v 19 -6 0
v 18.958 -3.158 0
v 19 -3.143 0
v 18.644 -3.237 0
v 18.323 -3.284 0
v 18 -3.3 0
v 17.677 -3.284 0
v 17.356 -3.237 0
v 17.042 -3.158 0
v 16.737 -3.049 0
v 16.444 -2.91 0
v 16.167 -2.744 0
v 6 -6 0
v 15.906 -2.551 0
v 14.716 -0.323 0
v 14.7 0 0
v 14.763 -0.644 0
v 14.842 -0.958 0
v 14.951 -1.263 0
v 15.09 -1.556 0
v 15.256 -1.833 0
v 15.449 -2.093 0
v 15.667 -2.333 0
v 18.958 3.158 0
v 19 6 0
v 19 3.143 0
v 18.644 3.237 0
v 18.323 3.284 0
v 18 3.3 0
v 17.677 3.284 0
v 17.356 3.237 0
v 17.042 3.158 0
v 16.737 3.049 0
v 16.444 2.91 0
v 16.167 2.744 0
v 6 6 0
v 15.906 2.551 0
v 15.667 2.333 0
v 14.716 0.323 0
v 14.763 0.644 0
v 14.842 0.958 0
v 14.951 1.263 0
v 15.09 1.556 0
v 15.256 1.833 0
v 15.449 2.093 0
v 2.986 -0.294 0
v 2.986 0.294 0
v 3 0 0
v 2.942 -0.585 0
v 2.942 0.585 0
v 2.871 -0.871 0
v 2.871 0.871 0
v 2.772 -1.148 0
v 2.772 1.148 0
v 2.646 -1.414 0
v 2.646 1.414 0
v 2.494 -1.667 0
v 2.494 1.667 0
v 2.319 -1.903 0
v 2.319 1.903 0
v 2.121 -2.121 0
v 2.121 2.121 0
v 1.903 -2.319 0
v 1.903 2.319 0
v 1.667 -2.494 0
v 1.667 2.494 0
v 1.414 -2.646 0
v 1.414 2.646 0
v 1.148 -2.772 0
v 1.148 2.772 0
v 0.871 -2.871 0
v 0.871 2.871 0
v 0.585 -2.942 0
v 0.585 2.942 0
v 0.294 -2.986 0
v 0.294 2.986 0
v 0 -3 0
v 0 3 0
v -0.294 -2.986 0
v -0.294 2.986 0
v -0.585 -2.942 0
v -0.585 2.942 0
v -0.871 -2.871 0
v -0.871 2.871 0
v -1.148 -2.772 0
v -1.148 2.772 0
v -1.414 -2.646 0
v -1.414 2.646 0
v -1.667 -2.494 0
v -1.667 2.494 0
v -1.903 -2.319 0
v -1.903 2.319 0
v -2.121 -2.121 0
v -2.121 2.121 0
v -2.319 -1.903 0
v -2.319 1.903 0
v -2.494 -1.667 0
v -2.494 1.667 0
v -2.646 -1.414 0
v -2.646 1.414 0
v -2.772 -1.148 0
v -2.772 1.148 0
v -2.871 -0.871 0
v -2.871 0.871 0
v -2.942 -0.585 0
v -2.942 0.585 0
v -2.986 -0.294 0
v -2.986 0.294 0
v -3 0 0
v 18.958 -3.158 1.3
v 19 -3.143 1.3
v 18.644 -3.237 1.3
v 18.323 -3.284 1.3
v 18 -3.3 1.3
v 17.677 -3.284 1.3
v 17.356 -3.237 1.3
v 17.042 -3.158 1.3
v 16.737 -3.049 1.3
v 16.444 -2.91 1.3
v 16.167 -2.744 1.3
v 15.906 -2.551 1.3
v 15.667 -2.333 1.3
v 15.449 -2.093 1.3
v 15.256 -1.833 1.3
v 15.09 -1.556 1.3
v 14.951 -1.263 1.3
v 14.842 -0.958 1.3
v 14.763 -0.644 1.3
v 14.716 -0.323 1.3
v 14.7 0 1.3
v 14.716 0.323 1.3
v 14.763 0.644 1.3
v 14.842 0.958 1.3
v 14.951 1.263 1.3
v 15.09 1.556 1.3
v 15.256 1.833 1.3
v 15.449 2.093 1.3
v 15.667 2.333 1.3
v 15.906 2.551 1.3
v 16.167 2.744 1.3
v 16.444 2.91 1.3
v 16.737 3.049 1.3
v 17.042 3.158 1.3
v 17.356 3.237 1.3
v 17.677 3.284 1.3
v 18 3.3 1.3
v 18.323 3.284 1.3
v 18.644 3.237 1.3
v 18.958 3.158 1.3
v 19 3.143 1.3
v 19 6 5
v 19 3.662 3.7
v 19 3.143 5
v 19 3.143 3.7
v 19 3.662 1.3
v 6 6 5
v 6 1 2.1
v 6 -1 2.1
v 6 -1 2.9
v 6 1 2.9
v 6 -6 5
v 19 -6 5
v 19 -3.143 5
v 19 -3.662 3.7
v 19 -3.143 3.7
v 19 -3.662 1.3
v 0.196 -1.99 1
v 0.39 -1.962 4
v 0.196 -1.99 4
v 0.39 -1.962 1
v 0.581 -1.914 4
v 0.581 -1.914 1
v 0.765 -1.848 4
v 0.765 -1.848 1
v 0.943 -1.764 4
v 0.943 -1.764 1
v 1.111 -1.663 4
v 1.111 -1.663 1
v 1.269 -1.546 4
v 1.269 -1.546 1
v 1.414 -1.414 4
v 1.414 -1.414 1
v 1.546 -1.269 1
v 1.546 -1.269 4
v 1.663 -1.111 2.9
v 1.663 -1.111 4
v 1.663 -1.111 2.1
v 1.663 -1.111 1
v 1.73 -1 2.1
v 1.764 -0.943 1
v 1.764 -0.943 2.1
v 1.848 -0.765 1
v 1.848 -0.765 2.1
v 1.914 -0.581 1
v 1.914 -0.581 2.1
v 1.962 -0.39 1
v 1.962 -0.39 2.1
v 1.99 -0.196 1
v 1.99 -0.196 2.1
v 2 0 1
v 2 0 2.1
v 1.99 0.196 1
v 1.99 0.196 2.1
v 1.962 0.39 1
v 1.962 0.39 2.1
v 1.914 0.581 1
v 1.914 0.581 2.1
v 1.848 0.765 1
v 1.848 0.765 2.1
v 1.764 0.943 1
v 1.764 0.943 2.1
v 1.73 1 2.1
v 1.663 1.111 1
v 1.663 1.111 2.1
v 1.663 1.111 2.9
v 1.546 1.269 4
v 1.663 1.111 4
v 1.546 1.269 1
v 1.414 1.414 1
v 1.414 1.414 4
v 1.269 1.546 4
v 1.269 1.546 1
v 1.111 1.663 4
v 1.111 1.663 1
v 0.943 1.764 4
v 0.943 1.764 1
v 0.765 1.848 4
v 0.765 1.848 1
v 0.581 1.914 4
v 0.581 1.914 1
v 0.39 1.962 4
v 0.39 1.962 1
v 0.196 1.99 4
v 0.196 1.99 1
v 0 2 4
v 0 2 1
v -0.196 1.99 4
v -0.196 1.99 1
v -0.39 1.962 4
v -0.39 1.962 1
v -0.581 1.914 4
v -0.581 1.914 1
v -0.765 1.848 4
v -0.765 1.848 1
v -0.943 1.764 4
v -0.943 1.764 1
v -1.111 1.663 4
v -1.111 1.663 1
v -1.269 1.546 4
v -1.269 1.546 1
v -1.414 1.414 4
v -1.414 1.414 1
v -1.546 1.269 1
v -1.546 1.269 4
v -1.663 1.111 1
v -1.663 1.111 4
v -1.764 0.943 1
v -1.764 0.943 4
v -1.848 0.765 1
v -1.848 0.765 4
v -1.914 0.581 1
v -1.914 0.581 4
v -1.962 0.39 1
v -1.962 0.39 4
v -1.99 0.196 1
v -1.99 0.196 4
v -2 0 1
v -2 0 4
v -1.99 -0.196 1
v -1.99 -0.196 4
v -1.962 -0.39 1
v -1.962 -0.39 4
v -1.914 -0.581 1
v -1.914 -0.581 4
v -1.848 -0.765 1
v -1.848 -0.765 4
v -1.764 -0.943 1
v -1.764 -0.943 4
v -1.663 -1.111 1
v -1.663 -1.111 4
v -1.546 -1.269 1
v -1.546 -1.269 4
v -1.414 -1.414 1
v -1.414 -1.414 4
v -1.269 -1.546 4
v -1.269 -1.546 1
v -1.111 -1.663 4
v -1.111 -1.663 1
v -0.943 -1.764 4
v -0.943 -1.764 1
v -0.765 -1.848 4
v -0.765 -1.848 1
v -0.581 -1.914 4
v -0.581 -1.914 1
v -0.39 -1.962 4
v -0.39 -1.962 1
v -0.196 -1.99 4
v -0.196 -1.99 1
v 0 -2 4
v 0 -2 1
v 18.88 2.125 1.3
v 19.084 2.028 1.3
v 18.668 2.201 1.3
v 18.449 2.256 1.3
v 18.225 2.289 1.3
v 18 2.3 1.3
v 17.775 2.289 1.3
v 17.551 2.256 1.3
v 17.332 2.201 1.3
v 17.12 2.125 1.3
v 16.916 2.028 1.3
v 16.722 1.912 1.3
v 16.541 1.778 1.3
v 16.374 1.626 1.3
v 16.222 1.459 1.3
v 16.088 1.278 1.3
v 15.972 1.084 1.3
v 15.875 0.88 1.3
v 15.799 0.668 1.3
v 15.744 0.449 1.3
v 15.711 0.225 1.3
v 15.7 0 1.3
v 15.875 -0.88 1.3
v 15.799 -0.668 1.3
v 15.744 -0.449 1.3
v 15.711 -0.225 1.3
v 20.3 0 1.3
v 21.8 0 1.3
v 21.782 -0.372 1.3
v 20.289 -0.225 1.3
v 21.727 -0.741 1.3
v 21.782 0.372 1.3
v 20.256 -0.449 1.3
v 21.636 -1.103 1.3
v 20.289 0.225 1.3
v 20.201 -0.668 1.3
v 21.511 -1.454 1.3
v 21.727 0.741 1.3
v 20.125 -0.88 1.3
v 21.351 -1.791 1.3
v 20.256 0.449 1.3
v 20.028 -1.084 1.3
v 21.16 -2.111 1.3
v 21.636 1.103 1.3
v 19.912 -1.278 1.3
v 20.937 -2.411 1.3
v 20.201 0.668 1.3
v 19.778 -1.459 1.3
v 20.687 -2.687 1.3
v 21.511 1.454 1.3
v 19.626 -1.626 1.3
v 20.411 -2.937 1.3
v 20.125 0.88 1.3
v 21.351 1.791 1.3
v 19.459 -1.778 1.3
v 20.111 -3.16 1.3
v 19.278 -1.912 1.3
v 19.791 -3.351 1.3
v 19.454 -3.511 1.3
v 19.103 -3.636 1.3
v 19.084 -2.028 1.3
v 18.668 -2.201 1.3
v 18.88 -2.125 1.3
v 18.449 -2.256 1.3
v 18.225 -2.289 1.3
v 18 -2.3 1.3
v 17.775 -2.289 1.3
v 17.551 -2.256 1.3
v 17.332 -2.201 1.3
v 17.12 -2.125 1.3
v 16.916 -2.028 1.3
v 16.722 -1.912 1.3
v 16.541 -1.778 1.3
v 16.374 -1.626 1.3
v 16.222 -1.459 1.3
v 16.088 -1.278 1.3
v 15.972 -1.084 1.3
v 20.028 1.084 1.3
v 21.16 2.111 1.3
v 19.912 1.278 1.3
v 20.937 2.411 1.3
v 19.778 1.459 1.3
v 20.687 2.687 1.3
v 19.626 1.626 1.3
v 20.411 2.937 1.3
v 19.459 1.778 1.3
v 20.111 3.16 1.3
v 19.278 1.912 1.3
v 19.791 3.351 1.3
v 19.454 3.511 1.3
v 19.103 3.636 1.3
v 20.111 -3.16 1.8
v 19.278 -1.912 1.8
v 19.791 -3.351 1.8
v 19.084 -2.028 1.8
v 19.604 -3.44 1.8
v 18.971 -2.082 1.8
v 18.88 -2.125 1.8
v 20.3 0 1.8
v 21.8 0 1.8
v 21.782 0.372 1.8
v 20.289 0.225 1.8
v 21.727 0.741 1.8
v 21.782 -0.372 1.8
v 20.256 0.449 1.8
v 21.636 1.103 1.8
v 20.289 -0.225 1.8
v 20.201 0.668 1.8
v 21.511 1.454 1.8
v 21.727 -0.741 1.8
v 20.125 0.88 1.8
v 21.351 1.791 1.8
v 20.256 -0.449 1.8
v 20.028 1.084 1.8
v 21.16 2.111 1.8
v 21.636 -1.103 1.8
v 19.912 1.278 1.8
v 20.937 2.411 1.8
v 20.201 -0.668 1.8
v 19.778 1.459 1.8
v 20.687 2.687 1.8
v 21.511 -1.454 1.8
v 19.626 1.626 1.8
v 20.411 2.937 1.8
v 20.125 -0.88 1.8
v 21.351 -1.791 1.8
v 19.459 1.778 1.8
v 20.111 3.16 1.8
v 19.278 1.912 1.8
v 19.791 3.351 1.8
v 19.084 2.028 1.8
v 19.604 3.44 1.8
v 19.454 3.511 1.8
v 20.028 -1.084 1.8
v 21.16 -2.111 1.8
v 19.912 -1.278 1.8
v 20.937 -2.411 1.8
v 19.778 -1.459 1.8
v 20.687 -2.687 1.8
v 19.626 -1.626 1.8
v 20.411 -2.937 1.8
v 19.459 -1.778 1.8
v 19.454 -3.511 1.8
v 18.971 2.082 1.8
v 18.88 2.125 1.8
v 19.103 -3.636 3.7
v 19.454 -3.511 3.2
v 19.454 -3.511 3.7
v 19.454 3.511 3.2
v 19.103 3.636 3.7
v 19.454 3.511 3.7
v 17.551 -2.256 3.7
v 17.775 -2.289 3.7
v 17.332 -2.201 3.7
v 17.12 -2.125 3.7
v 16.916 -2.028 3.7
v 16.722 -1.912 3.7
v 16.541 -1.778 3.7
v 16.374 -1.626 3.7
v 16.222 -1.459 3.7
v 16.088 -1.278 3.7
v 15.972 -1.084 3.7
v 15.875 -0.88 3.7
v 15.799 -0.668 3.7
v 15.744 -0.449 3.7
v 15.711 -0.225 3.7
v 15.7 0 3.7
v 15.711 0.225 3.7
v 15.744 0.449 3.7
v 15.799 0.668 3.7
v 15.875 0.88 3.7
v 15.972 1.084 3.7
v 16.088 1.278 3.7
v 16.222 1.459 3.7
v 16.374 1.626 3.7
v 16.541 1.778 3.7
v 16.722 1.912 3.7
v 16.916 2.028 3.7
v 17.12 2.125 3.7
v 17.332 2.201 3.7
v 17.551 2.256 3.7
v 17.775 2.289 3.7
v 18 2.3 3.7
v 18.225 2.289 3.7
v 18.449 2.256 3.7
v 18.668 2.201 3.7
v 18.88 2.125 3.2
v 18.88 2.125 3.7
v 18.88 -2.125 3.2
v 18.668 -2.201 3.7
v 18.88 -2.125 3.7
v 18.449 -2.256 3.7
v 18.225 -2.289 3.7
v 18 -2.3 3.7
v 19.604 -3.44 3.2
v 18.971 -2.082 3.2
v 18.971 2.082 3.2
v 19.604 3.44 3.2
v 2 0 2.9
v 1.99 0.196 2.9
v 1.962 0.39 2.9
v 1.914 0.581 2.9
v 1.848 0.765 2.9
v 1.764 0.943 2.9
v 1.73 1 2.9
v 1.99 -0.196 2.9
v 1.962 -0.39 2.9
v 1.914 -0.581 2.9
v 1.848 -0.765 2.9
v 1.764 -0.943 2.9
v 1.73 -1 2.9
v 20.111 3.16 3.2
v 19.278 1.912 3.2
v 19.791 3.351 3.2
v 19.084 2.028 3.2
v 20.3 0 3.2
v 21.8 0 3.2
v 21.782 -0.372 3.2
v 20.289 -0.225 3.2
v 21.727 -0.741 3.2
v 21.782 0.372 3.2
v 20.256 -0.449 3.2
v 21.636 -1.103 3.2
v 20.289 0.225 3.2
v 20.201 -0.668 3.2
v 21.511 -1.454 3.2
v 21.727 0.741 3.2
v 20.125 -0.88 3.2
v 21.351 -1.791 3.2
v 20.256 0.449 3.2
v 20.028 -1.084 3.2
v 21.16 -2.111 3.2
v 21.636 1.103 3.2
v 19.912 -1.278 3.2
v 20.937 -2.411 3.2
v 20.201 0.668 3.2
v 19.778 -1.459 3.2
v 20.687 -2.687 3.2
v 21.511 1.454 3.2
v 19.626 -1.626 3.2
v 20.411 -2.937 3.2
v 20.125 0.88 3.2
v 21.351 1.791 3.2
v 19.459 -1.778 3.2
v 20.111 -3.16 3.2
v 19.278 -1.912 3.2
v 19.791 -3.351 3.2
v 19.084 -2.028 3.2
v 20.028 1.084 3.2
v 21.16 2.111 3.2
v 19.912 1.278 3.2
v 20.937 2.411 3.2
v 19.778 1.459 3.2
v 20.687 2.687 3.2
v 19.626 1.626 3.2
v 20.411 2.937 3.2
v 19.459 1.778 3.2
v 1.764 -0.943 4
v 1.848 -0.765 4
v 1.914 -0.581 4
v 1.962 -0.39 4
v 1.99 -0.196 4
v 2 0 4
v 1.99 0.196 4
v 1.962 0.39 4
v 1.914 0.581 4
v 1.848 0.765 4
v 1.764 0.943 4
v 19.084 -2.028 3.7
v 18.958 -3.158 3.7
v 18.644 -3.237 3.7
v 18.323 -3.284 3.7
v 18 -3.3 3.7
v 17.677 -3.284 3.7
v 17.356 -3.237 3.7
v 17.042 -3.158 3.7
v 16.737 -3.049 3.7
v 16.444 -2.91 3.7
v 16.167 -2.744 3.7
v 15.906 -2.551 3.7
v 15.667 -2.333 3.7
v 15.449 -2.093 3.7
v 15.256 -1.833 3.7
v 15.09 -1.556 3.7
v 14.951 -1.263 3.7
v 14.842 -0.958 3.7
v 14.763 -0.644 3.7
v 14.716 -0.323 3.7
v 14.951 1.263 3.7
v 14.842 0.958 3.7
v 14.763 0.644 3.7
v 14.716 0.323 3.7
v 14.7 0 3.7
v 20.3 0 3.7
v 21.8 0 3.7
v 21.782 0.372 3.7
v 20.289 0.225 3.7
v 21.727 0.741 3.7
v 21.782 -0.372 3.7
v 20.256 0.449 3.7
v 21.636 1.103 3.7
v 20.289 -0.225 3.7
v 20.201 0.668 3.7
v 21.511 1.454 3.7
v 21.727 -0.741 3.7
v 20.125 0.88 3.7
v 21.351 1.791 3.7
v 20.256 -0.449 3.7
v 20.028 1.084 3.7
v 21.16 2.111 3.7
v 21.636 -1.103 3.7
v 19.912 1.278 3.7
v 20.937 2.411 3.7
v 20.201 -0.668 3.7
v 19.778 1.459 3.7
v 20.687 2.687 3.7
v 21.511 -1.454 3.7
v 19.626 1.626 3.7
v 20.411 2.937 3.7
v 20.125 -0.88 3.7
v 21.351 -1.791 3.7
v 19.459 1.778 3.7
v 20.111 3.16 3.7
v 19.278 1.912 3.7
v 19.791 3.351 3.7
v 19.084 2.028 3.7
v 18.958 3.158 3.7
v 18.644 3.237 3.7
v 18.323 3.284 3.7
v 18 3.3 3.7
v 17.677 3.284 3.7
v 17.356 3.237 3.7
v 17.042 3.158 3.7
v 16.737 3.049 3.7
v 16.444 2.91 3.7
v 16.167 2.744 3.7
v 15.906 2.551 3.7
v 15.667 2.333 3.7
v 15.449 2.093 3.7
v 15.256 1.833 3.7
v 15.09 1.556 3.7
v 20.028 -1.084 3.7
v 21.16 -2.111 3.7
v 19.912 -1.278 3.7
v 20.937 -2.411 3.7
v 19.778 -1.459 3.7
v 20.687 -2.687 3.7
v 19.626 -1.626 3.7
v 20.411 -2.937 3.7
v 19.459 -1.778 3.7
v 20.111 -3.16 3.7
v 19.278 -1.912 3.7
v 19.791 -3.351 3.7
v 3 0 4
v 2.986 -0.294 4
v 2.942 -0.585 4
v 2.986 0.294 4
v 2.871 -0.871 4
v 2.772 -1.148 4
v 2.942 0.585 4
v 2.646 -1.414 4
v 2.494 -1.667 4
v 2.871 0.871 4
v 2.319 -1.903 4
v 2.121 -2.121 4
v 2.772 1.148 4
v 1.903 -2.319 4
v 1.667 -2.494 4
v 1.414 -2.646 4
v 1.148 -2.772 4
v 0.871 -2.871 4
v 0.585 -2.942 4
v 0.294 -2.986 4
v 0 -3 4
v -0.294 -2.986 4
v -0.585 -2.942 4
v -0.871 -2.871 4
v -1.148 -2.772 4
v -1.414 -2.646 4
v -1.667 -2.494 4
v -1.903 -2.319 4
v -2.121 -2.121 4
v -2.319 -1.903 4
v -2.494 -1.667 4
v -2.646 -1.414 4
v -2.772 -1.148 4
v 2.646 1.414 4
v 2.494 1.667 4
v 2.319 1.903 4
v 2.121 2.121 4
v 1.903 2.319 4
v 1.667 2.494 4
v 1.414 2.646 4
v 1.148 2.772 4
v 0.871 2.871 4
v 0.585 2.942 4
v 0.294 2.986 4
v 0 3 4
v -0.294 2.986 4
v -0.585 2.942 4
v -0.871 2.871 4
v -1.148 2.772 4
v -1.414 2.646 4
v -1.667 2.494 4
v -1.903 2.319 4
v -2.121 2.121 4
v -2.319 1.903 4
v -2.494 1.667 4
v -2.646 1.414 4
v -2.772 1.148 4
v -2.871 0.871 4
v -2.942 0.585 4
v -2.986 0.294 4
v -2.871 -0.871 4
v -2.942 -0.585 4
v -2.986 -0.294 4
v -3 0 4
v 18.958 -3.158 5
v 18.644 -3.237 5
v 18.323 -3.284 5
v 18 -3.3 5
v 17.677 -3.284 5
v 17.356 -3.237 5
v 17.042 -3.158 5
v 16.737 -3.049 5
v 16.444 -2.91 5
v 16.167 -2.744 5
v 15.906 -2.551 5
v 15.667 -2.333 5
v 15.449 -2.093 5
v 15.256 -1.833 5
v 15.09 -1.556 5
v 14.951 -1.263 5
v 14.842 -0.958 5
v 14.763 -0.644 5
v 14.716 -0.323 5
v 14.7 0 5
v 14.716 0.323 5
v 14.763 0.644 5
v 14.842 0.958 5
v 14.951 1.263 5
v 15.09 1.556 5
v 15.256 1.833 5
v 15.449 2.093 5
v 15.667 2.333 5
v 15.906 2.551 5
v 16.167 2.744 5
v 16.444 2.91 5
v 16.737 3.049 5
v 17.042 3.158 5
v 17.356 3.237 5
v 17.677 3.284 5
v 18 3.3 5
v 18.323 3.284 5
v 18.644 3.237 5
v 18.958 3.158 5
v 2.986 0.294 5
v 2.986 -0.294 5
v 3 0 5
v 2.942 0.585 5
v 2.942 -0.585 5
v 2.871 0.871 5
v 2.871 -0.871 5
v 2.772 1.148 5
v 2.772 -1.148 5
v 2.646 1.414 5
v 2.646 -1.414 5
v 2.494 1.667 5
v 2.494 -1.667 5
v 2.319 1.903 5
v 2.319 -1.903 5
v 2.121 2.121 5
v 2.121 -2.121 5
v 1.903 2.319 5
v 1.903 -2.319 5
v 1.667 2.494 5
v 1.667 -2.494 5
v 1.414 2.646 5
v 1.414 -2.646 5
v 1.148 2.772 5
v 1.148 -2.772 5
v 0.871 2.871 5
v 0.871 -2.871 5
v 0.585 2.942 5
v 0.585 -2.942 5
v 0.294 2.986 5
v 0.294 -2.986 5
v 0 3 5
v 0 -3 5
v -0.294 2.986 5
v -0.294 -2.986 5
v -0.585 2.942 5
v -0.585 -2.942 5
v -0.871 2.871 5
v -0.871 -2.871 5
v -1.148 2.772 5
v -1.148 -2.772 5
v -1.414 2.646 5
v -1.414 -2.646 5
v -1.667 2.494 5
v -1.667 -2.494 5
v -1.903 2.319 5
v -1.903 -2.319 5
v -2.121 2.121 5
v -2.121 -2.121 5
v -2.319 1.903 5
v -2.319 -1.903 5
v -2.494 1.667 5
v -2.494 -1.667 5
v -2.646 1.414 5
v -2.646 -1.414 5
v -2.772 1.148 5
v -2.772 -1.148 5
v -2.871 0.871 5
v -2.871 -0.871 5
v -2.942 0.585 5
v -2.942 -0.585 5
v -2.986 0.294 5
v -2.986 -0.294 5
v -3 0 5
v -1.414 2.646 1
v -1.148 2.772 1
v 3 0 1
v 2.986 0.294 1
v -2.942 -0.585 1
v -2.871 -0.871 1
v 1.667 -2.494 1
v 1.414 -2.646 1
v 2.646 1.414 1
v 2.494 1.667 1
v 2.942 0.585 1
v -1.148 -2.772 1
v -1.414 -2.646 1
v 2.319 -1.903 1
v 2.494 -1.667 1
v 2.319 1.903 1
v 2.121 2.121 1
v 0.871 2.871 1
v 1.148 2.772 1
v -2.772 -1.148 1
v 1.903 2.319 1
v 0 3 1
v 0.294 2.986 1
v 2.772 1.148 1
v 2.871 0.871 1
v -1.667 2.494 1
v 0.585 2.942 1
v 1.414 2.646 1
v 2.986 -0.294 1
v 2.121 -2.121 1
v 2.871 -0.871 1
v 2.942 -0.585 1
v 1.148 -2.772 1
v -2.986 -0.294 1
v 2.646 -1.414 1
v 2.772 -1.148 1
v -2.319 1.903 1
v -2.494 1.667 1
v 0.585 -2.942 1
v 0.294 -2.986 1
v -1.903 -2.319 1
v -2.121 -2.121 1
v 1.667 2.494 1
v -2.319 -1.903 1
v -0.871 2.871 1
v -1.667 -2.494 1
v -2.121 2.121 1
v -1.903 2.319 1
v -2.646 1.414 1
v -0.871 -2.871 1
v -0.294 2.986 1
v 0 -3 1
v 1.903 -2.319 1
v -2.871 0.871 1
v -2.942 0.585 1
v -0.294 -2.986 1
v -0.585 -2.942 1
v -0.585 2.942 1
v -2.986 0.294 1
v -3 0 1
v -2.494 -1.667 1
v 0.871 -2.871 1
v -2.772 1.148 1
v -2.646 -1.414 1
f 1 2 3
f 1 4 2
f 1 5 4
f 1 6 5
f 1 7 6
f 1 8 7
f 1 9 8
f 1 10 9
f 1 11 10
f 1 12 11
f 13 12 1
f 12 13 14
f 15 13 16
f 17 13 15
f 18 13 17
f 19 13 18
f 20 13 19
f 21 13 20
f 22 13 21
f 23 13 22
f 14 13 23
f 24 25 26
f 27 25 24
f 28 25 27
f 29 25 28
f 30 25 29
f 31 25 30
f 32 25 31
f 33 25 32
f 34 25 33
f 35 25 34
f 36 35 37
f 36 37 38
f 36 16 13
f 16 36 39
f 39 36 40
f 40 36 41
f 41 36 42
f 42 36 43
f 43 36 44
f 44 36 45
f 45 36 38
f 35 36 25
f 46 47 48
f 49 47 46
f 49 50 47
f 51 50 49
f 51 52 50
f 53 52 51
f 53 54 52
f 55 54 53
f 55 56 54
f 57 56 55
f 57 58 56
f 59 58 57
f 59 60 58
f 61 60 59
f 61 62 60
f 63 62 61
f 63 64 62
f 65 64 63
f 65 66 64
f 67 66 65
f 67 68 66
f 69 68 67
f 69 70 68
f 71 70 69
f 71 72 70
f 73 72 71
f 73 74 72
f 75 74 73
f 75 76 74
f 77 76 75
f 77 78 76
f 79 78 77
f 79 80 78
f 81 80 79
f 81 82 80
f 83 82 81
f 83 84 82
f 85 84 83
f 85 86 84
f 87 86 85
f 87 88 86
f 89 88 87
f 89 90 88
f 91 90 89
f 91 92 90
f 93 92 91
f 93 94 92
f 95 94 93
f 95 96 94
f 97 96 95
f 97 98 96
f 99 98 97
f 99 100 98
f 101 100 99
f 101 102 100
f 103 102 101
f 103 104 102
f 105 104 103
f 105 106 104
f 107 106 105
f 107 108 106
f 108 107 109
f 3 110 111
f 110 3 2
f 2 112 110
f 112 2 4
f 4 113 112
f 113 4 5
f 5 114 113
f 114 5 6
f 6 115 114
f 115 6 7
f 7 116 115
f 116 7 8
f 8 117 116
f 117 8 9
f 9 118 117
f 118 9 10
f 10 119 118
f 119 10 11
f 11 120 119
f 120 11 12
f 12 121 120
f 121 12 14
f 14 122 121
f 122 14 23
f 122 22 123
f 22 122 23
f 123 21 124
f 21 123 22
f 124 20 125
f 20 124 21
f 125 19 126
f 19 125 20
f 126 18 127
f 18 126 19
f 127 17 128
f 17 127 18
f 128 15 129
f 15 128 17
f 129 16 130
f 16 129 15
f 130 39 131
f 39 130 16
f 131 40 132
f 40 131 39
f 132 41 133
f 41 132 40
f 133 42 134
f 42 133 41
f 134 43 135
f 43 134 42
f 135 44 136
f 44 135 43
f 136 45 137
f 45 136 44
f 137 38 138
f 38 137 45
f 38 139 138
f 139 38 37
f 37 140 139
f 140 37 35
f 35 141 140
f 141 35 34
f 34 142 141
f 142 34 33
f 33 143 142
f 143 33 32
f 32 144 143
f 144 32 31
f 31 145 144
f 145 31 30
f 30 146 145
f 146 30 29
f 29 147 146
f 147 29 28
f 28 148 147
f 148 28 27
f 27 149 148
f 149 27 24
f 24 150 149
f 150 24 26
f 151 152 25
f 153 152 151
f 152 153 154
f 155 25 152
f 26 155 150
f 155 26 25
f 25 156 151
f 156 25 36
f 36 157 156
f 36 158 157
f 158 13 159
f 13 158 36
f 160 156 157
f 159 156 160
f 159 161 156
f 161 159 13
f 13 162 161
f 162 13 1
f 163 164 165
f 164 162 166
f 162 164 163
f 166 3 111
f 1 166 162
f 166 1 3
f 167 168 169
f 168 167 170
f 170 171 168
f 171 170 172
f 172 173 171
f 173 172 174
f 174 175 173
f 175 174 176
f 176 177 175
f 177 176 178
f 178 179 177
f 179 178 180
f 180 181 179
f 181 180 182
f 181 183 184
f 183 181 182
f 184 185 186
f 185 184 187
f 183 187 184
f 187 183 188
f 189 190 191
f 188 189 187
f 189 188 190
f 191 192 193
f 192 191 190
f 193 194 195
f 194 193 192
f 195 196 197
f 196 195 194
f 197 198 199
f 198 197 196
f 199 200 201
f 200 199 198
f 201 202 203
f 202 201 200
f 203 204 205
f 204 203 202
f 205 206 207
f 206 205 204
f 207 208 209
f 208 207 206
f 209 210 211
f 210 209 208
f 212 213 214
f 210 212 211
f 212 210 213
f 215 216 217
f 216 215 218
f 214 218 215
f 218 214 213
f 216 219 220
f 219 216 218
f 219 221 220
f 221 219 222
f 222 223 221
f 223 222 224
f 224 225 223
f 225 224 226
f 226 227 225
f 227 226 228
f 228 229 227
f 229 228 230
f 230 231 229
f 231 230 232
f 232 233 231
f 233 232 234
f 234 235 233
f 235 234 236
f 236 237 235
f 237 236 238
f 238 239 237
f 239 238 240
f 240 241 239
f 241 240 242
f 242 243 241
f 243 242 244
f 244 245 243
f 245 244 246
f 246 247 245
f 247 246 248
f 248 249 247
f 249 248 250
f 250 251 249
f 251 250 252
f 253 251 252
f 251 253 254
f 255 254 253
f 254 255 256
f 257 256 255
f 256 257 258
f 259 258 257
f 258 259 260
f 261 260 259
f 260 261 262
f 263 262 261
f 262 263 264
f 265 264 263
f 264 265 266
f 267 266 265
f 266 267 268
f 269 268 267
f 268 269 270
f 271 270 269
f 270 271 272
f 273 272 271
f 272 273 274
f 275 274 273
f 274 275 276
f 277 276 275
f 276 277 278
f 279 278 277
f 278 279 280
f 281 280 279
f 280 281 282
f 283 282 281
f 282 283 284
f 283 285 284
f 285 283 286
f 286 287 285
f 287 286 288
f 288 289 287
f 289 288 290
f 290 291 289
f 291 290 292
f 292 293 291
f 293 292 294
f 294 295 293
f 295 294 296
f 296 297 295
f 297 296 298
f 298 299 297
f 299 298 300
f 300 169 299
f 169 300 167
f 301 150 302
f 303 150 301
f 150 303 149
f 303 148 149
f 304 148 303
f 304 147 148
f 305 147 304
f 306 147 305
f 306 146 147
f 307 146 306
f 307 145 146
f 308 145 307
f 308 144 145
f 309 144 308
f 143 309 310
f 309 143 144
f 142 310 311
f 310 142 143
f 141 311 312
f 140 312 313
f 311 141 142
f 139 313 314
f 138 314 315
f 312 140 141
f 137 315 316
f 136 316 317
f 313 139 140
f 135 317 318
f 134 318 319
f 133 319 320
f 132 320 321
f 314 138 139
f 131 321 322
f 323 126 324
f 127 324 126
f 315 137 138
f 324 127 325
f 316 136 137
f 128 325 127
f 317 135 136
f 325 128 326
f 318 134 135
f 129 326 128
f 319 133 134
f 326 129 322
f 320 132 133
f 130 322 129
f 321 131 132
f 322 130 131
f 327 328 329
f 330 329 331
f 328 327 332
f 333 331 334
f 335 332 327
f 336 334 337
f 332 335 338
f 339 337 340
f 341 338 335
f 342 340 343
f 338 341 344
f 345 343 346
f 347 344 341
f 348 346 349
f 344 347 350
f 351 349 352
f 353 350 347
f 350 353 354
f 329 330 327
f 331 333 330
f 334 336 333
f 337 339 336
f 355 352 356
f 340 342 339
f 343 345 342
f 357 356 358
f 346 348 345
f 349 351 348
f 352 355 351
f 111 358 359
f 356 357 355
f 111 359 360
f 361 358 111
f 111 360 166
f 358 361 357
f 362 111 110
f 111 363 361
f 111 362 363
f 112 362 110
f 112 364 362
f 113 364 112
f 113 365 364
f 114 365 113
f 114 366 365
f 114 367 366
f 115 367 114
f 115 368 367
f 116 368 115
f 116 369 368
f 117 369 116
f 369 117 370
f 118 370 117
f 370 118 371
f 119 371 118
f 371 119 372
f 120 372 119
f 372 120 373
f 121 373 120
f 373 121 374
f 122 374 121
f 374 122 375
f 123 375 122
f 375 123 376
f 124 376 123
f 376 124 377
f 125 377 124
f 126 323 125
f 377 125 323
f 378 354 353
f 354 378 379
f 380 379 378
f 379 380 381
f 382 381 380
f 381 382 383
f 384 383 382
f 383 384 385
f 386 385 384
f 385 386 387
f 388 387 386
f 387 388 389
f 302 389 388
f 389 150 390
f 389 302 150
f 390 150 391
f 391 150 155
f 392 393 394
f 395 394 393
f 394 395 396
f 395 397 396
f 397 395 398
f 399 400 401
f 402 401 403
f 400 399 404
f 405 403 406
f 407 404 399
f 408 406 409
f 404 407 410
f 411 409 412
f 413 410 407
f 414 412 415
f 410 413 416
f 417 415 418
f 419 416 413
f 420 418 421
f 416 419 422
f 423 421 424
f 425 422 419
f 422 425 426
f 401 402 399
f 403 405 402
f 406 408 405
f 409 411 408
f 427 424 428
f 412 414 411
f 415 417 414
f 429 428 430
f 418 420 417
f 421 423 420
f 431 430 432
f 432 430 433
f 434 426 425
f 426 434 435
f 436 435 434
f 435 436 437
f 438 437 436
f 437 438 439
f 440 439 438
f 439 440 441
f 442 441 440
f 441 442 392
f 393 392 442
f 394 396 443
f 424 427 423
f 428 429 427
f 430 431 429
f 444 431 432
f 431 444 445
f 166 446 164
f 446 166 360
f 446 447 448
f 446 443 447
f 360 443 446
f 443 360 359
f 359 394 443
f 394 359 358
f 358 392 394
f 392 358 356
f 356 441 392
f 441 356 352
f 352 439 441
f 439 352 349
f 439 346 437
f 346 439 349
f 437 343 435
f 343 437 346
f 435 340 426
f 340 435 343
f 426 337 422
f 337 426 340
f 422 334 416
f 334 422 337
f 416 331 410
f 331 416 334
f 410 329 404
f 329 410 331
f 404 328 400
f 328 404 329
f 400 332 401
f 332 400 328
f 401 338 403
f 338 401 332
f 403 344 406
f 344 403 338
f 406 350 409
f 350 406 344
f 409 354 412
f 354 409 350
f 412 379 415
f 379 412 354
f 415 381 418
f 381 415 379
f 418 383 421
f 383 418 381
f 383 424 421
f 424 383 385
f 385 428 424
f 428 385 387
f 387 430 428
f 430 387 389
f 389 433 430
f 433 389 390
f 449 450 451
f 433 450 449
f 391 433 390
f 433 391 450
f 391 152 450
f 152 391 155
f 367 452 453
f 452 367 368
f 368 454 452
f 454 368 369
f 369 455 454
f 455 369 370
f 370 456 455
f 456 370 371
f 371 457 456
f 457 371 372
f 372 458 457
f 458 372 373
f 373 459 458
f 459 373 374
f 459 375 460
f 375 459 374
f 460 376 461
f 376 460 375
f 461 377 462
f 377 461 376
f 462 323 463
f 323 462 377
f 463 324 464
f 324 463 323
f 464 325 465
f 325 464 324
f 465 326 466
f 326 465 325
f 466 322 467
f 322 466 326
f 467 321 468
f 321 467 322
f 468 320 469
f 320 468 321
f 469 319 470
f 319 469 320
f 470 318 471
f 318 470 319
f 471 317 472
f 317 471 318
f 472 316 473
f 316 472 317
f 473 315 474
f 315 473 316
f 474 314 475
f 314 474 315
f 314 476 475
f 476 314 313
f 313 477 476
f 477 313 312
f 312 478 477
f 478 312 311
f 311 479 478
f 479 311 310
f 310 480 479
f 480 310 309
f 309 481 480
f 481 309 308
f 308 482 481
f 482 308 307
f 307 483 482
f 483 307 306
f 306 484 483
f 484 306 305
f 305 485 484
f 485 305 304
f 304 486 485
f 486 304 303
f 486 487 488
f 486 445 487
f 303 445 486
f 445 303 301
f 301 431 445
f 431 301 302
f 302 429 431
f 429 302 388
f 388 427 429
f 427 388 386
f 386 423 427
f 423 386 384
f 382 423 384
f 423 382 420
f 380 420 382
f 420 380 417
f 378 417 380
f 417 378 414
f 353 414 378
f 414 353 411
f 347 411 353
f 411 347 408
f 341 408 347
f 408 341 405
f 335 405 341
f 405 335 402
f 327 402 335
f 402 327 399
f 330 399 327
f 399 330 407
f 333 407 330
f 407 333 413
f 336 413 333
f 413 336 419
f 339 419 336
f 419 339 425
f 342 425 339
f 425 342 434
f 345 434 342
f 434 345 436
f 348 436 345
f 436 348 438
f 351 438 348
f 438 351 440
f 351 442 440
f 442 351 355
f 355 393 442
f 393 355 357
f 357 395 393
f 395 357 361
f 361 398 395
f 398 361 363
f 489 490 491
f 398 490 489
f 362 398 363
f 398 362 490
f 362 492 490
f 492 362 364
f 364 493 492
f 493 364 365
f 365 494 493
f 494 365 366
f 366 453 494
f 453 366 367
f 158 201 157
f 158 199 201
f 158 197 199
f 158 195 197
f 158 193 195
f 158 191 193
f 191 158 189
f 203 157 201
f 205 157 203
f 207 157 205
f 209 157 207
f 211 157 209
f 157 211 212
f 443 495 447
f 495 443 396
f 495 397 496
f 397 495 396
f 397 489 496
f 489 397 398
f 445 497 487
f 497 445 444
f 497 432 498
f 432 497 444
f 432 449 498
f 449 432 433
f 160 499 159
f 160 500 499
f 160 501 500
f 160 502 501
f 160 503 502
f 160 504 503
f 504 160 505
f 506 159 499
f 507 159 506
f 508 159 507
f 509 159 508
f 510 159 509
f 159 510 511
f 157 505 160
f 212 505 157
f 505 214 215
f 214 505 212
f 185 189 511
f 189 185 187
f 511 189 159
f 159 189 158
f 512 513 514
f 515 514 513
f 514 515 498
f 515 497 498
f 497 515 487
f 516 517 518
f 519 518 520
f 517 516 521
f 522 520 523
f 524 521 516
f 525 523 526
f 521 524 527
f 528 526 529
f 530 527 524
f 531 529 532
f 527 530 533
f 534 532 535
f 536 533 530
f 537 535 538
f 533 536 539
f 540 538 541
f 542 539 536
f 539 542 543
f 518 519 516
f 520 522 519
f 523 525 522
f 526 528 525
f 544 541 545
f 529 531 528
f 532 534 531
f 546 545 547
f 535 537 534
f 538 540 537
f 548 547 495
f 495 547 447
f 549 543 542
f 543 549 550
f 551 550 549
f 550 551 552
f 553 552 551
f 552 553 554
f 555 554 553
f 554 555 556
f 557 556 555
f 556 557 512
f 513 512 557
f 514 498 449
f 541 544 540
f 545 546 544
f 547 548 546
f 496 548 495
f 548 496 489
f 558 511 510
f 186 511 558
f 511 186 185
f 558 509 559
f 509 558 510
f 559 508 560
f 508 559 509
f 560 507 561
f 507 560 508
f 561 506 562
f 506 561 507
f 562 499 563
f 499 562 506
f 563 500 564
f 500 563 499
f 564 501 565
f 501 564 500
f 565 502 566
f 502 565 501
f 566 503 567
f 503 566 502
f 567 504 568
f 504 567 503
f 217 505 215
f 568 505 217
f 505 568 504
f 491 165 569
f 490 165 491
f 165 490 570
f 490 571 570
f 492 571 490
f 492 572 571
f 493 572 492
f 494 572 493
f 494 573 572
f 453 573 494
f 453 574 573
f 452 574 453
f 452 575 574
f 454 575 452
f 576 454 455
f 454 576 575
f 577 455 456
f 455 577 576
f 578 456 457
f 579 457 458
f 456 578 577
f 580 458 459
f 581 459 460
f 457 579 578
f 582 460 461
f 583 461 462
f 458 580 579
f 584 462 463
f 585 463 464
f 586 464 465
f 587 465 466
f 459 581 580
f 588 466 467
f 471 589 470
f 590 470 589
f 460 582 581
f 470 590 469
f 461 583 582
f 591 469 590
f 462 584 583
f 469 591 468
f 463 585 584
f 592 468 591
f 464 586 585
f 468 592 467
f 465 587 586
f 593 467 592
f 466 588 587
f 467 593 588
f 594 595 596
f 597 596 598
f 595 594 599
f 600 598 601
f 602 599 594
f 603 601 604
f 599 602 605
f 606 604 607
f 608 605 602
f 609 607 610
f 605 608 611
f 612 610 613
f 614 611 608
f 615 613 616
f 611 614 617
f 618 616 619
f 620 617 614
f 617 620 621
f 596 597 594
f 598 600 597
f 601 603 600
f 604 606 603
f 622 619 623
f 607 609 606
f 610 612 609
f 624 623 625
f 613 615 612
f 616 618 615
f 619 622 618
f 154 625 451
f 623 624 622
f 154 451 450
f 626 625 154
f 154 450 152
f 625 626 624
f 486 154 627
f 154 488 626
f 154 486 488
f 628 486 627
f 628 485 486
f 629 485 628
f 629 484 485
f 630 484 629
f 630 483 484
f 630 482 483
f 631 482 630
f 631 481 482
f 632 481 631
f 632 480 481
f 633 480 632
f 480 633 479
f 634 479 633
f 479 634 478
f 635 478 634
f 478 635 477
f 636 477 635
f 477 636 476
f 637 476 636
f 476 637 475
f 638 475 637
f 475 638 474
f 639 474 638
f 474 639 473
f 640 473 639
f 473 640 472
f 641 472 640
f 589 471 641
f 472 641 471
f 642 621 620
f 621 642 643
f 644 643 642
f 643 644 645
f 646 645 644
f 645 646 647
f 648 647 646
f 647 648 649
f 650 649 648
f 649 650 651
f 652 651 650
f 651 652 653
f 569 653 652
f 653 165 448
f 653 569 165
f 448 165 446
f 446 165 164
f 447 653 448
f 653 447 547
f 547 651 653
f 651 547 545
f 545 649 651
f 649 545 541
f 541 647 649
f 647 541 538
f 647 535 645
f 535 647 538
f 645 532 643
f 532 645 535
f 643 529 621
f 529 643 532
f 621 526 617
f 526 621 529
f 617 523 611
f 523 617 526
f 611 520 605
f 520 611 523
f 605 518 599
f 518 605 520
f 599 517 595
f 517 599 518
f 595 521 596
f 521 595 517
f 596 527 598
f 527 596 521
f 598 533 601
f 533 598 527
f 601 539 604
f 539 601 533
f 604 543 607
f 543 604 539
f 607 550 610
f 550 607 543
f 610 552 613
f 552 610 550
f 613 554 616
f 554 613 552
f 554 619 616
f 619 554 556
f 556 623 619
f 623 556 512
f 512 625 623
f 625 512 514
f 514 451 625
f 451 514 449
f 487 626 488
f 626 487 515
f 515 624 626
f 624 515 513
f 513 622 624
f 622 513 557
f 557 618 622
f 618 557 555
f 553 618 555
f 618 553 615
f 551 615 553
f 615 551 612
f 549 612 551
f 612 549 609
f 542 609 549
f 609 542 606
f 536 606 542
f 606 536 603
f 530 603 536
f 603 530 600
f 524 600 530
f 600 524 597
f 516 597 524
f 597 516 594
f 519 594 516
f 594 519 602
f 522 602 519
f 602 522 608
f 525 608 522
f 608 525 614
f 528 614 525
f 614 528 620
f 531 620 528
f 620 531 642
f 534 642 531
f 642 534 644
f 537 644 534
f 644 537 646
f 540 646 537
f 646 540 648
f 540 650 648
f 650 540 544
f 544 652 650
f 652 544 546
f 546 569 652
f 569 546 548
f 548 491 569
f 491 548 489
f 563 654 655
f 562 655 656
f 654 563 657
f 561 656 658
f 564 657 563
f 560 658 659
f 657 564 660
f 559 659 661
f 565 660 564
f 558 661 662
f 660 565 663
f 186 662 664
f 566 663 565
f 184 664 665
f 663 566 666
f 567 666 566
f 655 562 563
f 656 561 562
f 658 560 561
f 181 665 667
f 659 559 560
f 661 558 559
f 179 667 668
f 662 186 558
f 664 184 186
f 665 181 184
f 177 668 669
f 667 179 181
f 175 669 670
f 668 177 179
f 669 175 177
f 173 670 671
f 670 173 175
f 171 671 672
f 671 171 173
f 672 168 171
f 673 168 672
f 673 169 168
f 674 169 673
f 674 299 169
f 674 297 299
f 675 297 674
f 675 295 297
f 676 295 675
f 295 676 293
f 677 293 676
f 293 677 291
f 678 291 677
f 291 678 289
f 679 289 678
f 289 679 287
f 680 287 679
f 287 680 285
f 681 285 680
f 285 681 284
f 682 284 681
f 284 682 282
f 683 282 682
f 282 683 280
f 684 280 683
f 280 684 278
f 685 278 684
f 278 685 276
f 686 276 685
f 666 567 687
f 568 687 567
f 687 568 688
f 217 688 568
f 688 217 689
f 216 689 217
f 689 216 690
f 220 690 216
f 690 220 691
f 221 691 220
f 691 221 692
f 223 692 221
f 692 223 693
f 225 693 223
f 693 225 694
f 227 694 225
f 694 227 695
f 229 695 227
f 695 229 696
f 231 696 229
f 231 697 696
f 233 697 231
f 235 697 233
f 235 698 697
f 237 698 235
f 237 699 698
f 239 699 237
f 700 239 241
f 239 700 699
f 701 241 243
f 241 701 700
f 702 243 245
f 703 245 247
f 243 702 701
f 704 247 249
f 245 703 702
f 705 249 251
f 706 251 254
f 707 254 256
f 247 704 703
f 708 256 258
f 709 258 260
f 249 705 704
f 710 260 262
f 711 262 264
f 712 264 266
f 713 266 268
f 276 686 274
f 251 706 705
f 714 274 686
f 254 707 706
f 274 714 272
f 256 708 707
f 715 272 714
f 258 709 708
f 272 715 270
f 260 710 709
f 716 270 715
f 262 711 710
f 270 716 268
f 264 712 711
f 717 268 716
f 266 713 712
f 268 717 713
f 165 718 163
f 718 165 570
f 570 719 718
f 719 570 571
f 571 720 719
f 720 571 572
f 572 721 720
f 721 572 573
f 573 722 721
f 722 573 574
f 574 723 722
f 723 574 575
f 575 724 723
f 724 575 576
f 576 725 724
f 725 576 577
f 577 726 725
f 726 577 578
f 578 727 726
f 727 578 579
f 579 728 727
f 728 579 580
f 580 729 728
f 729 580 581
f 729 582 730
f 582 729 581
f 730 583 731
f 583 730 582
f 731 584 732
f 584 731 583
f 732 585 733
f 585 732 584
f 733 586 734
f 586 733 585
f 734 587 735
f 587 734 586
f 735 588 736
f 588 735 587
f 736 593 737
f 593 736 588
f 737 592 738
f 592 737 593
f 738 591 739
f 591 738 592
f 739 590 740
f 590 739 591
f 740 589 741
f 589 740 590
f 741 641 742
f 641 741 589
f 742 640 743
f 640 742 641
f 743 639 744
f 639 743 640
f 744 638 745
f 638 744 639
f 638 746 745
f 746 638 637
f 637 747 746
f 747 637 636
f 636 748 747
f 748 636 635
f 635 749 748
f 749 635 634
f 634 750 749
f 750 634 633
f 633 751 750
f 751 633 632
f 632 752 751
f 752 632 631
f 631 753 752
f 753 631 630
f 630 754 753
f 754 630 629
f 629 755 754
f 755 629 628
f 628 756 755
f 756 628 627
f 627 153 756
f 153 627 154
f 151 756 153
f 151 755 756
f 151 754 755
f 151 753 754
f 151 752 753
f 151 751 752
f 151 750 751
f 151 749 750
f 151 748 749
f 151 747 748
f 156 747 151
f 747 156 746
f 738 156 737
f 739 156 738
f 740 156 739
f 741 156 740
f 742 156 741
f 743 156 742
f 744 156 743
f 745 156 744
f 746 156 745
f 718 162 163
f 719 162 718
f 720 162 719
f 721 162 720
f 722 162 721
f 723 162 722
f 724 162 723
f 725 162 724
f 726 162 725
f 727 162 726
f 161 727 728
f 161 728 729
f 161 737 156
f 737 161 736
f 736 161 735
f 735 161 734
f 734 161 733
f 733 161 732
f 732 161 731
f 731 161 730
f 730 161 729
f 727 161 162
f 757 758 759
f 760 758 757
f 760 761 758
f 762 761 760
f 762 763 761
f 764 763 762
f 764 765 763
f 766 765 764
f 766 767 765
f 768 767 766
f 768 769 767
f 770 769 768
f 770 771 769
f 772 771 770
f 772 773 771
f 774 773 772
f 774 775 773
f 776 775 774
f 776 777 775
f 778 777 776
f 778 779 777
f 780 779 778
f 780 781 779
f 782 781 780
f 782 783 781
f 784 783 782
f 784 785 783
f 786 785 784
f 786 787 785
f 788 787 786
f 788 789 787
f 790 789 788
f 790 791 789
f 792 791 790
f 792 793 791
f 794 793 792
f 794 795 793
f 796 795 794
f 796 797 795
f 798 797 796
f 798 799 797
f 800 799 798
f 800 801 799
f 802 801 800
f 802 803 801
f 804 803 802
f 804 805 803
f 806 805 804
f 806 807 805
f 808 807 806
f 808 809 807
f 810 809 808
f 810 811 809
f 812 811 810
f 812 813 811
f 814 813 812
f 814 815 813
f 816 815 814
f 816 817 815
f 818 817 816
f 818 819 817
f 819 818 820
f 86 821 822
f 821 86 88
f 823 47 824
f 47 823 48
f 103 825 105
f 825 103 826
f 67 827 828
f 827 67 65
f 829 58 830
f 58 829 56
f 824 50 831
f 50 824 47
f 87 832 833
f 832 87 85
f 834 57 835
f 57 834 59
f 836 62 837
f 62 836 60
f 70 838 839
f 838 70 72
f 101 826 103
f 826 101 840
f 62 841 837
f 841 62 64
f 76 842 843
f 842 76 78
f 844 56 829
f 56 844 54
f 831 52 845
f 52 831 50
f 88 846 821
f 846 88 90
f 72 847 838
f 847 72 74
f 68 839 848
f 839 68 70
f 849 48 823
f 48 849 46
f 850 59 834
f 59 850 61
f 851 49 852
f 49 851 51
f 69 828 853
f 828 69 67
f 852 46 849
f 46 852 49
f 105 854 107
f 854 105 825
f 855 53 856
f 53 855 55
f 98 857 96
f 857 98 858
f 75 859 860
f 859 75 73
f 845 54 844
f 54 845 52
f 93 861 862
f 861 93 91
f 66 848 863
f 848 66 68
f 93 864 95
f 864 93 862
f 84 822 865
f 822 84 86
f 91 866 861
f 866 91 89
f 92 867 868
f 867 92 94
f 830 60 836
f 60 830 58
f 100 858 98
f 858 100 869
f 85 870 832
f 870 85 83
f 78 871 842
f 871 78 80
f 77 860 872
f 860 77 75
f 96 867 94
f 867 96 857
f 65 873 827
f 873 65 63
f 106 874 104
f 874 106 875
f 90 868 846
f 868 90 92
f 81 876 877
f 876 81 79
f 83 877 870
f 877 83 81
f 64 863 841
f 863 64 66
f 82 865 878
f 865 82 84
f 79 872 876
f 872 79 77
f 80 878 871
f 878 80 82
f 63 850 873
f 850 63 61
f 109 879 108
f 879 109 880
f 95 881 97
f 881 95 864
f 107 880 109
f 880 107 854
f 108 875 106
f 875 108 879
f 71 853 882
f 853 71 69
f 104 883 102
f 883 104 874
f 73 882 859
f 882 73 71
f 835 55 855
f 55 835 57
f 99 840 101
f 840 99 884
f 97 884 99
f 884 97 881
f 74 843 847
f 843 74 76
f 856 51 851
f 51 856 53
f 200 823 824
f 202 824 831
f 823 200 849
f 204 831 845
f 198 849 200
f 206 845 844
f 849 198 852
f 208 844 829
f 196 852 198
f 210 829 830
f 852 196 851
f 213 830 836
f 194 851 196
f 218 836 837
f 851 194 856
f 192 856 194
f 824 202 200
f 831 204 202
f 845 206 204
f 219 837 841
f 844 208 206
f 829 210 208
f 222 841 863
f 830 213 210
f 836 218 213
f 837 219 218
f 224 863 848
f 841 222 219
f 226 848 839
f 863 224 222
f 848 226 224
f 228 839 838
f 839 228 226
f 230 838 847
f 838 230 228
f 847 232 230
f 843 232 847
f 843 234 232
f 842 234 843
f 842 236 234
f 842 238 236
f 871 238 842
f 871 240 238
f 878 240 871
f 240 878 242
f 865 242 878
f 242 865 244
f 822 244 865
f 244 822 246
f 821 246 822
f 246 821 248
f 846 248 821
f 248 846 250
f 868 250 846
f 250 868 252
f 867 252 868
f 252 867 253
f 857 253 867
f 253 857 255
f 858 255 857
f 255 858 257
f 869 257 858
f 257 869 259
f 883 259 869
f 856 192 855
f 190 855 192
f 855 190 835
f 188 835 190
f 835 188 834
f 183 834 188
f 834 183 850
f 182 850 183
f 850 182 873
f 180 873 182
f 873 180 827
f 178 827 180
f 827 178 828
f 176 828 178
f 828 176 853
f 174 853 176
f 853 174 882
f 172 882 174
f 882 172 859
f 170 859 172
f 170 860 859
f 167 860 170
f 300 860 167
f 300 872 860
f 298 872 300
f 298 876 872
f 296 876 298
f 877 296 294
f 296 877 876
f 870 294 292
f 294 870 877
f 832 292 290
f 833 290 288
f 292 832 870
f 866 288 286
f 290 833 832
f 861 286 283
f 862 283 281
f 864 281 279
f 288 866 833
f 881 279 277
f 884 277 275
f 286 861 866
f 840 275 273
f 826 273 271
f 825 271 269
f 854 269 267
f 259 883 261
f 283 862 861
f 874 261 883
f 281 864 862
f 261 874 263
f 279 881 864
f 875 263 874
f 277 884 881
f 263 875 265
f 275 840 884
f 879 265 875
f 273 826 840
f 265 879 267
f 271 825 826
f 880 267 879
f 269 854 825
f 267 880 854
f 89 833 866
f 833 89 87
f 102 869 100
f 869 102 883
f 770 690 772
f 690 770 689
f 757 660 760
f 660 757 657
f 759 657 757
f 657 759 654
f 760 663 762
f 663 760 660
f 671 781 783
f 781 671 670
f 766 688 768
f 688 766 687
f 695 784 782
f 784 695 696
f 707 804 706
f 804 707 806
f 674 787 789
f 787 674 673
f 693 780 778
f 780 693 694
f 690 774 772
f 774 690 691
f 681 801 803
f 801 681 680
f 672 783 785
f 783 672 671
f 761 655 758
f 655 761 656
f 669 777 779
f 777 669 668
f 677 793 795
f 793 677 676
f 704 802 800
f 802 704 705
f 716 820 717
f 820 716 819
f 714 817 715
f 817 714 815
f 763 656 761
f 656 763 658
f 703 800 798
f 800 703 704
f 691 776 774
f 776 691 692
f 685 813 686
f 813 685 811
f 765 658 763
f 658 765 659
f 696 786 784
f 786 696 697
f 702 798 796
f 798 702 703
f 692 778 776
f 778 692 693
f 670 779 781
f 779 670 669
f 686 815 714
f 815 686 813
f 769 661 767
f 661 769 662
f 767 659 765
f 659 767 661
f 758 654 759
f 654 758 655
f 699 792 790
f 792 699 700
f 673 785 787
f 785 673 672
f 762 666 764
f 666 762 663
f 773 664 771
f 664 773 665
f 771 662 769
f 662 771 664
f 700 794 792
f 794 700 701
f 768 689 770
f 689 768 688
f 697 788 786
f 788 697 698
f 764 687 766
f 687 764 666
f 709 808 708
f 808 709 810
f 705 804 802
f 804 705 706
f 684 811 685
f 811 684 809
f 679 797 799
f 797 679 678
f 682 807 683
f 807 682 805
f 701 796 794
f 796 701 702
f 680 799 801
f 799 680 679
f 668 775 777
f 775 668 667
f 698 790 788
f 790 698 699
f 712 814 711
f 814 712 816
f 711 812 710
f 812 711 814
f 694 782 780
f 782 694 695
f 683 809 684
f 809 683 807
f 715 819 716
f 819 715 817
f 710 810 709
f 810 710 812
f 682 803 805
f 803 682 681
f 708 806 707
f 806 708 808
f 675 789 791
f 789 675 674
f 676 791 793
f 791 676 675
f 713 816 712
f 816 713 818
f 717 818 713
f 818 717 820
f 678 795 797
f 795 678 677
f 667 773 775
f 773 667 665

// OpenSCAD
part = "link"; // [link, assembly]
cadverify_only = "";
module instance(name, part, unit = 1) {
    echo(cadverify_instance = [name, part, unit]);
    if (cadverify_only == "" || cadverify_only == name) children();
}

// Parameters (mm)
pitch = 18;          // pin-to-bore distance (10 links = 180mm)
link_w = 12;         // width (Y)
link_t = 5;          // thickness (Z)
pin_d = 4;           // pin shaft diameter
bore_d = 4.6;        // bore diameter (0.3 radial clearance)
cap_d = 6;           // cap diameter
cap_h = 1;           // cap thickness
kn_out_d = 7.6;      // knuckle outer diameter (1.5 wall)
cap_cav_d = 6.6;     // cap clearance diameter (0.3 radial)
neck_w = 2;          // neck width
neck_t = 0.8;        // neck thickness (central only)
slot_half = 65;      // slot half-angle (deg), allows +-30 deg swing
yoke_west = 6;       // yoke west edge (local X)
yoke_east = 19;      // yoke east extent (local X)
$fn = 64;

module link_geom() {
    bore_x = pitch;
    pin_r = pin_d/2;
    bore_r = bore_d/2;
    kn_out_r = kn_out_d/2;
    cav_r = cap_cav_d/2;
    cap_r = cap_d/2;
    wedge_far = 30;
    dy_far = wedge_far * tan(slot_half);
    // Z stack
    z0=0; z1=cap_h;              // 0..1 bottom
    z2=z1+0.3;                   // 1..1.3 lower cap clearance
    z3=z2+0.5;                   // 1.3..1.8 lower lip (closed)
    z4=z3+0.3;                   // 1.8..2.1 lower neck gap (slotted)
    z5=z4+neck_t;                // 2.1..2.9 central (slotted, neck lives)
    z6=z5+0.3;                   // 2.9..3.2 upper neck gap (slotted)
    z7=z6+0.5;                   // 3.2..3.7 upper lip (closed)
    z8=z7+0.3;                   // 3.7..4.0 upper cap clearance
    z9=z8+cap_h;                 // 4..5 top
    // 2D helpers (modules can't take shapes, so inline each layer)
    // bottom (0..1)
    translate([0,0,z0]) linear_extrude(height=z1-z0, convexity=8) {
        difference() {
            union() {
                circle(r=pin_r);
                translate([yoke_west,-link_w/2]) square([yoke_east-yoke_west, link_w]);
            }
            translate([bore_x,0]) circle(r=cav_r);
        }
    }
    // lower cap clearance (1..1.3)
    translate([0,0,z1]) linear_extrude(height=z2-z1, convexity=8) {
        difference() {
            union() {
                circle(r=pin_r);
                translate([yoke_west,-link_w/2]) square([yoke_east-yoke_west, link_w]);
            }
            translate([bore_x,0]) circle(r=cav_r);
        }
    }
    // lower lip (1.3..1.8) closed bore
    translate([0,0,z2]) linear_extrude(height=z3-z2, convexity=8) {
        difference() {
            union() {
                circle(r=pin_r);
                translate([yoke_west,-link_w/2]) square([yoke_east-yoke_west, link_w]);
                translate([bore_x,0]) circle(r=kn_out_r);
            }
            translate([bore_x,0]) circle(r=bore_r);
        }
    }
    // lower neck gap (1.8..2.1) slotted
    translate([0,0,z3]) linear_extrude(height=z4-z3, convexity=8) {
        difference() {
            union() {
                circle(r=pin_r);
                translate([yoke_west,-link_w/2]) square([yoke_east-yoke_west, link_w]);
                translate([bore_x,0]) circle(r=kn_out_r);
            }
            translate([bore_x,0]) circle(r=bore_r);
            polygon(points=[[bore_x,0],[bore_x+wedge_far,dy_far],[bore_x+wedge_far,-dy_far]]);
        }
    }
    // central (2.1..2.9) slotted + neck
    translate([0,0,z4]) linear_extrude(height=z5-z4, convexity=8) {
        difference() {
            union() {
                circle(r=pin_r);
                translate([0,-neck_w/2]) square([yoke_west+1, neck_w]);
                translate([yoke_west,-link_w/2]) square([yoke_east-yoke_west, link_w]);
                translate([bore_x,0]) circle(r=kn_out_r);
            }
            translate([bore_x,0]) circle(r=bore_r);
            polygon(points=[[bore_x,0],[bore_x+wedge_far,dy_far],[bore_x+wedge_far,-dy_far]]);
        }
    }
    // upper neck gap (2.9..3.2) slotted
    translate([0,0,z5]) linear_extrude(height=z6-z5, convexity=8) {
        difference() {
            union() {
                circle(r=pin_r);
                translate([yoke_west,-link_w/2]) square([yoke_east-yoke_west, link_w]);
                translate([bore_x,0]) circle(r=kn_out_r);
            }
            translate([bore_x,0]) circle(r=bore_r);
            polygon(points=[[bore_x,0],[bore_x+wedge_far,dy_far],[bore_x+wedge_far,-dy_far]]);
        }
    }
    // upper lip (3.2..3.7) closed
    translate([0,0,z6]) linear_extrude(height=z7-z6, convexity=8) {
        difference() {
            union() {
                circle(r=pin_r);
                translate([yoke_west,-link_w/2]) square([yoke_east-yoke_west, link_w]);
                translate([bore_x,0]) circle(r=kn_out_r);
            }
            translate([bore_x,0]) circle(r=bore_r);
        }
    }
    // upper cap clearance (3.7..4)
    translate([0,0,z7]) linear_extrude(height=z8-z7, convexity=8) {
        difference() {
            union() {
                circle(r=pin_r);
                translate([yoke_west,-link_w/2]) square([yoke_east-yoke_west, link_w]);
            }
            translate([bore_x,0]) circle(r=cav_r);
        }
    }
    // top (4..5)
    translate([0,0,z8]) linear_extrude(height=z9-z8, convexity=8) {
        difference() {
            union() {
                circle(r=pin_r);
                translate([yoke_west,-link_w/2]) square([yoke_east-yoke_west, link_w]);
            }
            translate([bore_x,0]) circle(r=cav_r);
        }
    }
    // caps (pin ends)
    translate([0,0,0]) cylinder(h=cap_h, r=cap_r);
    translate([0,0,link_t-cap_h]) cylinder(h=cap_h, r=cap_r);
}

if (part == "assembly") {
    instance("link1", "link", 1) translate([0,0,0]) link_geom();
    instance("link2", "link", 1) translate([18,0,0]) link_geom();
    instance("link3", "link", 1) translate([36,0,0]) link_geom();
    echo(cadverify_spec = [
        ["bounds", [[-3, -6, 0], [57.9, 6, 5]]],
        ["support_faces", [["bed", "-z", 200]]],
        ["motions", [
            ["bend", ["link3"], "rotate", [36, 0, 0], [0, 0, 1], [-30, 30]]
        ]],
        ["assembly_order", [
            [["link1", "link2", "link3"], [0, 0, 0]]
        ]],
        ["print_in_place", 0.3],
        ["overhangs_allowed", [
            ["pin cap link1", [[-3, -3, 3.8], [3, 3, 4.2]]],
            ["knuckle joint1", [[14, -4, 1.0], [22, 4, 1.6]]],
            ["pin cap link2", [[15, -3, 3.8], [21, 3, 4.2]]],
            ["knuckle joint2", [[32, -4, 1.0], [40, 4, 1.6]]],
            ["pin cap link3", [[33, -3, 3.8], [39, 3, 4.2]]],
            ["knuckle end", [[50, -4, 1.0], [58, 4, 1.6]]]
        ]],
        ["held", ["link1", "link2", "link3"]]
    ]);
} else {
    link_geom();
    echo(cadverify_spec = [
        ["bounds", [[-3, -6, 0], [21.9, 6, 5]]],
        ["bodies", 1],
        ["through_holes", 2],
        ["support_faces", [["bed", "-z", 100]]],
        ["overhangs_allowed", [
            ["pin cap", [[-3, -3, 3.8], [3, 3, 4.2]]],
            ["knuckle ceiling", [[14, -4, 1.0], [22, 4, 2.0]]],
            ["upper lip", [[14, -4, 3.0], [22, 4, 3.4]]],
            ["neck underside", [[0, -1.5, 1.9], [7, 1.5, 3.1]]]
        ]],
        ["copies", 3],
        ["details", [
            ["body", "material", [[6, -6, 0], [14, 6, 5]], 0.85],
            ["neck", "material", [[0, -1, 2.1], [7, 1, 2.9]], 0.8],
            ["knuckle", "material", [[14.2, -3.8, 1.3], [21.8, 3.8, 3.7]], 0.25],
            ["slot", "void", [[19, -1, 2.1], [21, 1, 2.9]], 0.8],
            ["cap_cavity", "void", [[14.7, -3.3, 0], [21.3, 3.3, 1]], 0.5],
            ["wall", "thickness", [18, 7, 2.5], [0, -1, 0], 3.7],
            ["floor", "thickness", [9, 0, -1], [0, 0, 1], 5]
        ]]
    ]);
}
